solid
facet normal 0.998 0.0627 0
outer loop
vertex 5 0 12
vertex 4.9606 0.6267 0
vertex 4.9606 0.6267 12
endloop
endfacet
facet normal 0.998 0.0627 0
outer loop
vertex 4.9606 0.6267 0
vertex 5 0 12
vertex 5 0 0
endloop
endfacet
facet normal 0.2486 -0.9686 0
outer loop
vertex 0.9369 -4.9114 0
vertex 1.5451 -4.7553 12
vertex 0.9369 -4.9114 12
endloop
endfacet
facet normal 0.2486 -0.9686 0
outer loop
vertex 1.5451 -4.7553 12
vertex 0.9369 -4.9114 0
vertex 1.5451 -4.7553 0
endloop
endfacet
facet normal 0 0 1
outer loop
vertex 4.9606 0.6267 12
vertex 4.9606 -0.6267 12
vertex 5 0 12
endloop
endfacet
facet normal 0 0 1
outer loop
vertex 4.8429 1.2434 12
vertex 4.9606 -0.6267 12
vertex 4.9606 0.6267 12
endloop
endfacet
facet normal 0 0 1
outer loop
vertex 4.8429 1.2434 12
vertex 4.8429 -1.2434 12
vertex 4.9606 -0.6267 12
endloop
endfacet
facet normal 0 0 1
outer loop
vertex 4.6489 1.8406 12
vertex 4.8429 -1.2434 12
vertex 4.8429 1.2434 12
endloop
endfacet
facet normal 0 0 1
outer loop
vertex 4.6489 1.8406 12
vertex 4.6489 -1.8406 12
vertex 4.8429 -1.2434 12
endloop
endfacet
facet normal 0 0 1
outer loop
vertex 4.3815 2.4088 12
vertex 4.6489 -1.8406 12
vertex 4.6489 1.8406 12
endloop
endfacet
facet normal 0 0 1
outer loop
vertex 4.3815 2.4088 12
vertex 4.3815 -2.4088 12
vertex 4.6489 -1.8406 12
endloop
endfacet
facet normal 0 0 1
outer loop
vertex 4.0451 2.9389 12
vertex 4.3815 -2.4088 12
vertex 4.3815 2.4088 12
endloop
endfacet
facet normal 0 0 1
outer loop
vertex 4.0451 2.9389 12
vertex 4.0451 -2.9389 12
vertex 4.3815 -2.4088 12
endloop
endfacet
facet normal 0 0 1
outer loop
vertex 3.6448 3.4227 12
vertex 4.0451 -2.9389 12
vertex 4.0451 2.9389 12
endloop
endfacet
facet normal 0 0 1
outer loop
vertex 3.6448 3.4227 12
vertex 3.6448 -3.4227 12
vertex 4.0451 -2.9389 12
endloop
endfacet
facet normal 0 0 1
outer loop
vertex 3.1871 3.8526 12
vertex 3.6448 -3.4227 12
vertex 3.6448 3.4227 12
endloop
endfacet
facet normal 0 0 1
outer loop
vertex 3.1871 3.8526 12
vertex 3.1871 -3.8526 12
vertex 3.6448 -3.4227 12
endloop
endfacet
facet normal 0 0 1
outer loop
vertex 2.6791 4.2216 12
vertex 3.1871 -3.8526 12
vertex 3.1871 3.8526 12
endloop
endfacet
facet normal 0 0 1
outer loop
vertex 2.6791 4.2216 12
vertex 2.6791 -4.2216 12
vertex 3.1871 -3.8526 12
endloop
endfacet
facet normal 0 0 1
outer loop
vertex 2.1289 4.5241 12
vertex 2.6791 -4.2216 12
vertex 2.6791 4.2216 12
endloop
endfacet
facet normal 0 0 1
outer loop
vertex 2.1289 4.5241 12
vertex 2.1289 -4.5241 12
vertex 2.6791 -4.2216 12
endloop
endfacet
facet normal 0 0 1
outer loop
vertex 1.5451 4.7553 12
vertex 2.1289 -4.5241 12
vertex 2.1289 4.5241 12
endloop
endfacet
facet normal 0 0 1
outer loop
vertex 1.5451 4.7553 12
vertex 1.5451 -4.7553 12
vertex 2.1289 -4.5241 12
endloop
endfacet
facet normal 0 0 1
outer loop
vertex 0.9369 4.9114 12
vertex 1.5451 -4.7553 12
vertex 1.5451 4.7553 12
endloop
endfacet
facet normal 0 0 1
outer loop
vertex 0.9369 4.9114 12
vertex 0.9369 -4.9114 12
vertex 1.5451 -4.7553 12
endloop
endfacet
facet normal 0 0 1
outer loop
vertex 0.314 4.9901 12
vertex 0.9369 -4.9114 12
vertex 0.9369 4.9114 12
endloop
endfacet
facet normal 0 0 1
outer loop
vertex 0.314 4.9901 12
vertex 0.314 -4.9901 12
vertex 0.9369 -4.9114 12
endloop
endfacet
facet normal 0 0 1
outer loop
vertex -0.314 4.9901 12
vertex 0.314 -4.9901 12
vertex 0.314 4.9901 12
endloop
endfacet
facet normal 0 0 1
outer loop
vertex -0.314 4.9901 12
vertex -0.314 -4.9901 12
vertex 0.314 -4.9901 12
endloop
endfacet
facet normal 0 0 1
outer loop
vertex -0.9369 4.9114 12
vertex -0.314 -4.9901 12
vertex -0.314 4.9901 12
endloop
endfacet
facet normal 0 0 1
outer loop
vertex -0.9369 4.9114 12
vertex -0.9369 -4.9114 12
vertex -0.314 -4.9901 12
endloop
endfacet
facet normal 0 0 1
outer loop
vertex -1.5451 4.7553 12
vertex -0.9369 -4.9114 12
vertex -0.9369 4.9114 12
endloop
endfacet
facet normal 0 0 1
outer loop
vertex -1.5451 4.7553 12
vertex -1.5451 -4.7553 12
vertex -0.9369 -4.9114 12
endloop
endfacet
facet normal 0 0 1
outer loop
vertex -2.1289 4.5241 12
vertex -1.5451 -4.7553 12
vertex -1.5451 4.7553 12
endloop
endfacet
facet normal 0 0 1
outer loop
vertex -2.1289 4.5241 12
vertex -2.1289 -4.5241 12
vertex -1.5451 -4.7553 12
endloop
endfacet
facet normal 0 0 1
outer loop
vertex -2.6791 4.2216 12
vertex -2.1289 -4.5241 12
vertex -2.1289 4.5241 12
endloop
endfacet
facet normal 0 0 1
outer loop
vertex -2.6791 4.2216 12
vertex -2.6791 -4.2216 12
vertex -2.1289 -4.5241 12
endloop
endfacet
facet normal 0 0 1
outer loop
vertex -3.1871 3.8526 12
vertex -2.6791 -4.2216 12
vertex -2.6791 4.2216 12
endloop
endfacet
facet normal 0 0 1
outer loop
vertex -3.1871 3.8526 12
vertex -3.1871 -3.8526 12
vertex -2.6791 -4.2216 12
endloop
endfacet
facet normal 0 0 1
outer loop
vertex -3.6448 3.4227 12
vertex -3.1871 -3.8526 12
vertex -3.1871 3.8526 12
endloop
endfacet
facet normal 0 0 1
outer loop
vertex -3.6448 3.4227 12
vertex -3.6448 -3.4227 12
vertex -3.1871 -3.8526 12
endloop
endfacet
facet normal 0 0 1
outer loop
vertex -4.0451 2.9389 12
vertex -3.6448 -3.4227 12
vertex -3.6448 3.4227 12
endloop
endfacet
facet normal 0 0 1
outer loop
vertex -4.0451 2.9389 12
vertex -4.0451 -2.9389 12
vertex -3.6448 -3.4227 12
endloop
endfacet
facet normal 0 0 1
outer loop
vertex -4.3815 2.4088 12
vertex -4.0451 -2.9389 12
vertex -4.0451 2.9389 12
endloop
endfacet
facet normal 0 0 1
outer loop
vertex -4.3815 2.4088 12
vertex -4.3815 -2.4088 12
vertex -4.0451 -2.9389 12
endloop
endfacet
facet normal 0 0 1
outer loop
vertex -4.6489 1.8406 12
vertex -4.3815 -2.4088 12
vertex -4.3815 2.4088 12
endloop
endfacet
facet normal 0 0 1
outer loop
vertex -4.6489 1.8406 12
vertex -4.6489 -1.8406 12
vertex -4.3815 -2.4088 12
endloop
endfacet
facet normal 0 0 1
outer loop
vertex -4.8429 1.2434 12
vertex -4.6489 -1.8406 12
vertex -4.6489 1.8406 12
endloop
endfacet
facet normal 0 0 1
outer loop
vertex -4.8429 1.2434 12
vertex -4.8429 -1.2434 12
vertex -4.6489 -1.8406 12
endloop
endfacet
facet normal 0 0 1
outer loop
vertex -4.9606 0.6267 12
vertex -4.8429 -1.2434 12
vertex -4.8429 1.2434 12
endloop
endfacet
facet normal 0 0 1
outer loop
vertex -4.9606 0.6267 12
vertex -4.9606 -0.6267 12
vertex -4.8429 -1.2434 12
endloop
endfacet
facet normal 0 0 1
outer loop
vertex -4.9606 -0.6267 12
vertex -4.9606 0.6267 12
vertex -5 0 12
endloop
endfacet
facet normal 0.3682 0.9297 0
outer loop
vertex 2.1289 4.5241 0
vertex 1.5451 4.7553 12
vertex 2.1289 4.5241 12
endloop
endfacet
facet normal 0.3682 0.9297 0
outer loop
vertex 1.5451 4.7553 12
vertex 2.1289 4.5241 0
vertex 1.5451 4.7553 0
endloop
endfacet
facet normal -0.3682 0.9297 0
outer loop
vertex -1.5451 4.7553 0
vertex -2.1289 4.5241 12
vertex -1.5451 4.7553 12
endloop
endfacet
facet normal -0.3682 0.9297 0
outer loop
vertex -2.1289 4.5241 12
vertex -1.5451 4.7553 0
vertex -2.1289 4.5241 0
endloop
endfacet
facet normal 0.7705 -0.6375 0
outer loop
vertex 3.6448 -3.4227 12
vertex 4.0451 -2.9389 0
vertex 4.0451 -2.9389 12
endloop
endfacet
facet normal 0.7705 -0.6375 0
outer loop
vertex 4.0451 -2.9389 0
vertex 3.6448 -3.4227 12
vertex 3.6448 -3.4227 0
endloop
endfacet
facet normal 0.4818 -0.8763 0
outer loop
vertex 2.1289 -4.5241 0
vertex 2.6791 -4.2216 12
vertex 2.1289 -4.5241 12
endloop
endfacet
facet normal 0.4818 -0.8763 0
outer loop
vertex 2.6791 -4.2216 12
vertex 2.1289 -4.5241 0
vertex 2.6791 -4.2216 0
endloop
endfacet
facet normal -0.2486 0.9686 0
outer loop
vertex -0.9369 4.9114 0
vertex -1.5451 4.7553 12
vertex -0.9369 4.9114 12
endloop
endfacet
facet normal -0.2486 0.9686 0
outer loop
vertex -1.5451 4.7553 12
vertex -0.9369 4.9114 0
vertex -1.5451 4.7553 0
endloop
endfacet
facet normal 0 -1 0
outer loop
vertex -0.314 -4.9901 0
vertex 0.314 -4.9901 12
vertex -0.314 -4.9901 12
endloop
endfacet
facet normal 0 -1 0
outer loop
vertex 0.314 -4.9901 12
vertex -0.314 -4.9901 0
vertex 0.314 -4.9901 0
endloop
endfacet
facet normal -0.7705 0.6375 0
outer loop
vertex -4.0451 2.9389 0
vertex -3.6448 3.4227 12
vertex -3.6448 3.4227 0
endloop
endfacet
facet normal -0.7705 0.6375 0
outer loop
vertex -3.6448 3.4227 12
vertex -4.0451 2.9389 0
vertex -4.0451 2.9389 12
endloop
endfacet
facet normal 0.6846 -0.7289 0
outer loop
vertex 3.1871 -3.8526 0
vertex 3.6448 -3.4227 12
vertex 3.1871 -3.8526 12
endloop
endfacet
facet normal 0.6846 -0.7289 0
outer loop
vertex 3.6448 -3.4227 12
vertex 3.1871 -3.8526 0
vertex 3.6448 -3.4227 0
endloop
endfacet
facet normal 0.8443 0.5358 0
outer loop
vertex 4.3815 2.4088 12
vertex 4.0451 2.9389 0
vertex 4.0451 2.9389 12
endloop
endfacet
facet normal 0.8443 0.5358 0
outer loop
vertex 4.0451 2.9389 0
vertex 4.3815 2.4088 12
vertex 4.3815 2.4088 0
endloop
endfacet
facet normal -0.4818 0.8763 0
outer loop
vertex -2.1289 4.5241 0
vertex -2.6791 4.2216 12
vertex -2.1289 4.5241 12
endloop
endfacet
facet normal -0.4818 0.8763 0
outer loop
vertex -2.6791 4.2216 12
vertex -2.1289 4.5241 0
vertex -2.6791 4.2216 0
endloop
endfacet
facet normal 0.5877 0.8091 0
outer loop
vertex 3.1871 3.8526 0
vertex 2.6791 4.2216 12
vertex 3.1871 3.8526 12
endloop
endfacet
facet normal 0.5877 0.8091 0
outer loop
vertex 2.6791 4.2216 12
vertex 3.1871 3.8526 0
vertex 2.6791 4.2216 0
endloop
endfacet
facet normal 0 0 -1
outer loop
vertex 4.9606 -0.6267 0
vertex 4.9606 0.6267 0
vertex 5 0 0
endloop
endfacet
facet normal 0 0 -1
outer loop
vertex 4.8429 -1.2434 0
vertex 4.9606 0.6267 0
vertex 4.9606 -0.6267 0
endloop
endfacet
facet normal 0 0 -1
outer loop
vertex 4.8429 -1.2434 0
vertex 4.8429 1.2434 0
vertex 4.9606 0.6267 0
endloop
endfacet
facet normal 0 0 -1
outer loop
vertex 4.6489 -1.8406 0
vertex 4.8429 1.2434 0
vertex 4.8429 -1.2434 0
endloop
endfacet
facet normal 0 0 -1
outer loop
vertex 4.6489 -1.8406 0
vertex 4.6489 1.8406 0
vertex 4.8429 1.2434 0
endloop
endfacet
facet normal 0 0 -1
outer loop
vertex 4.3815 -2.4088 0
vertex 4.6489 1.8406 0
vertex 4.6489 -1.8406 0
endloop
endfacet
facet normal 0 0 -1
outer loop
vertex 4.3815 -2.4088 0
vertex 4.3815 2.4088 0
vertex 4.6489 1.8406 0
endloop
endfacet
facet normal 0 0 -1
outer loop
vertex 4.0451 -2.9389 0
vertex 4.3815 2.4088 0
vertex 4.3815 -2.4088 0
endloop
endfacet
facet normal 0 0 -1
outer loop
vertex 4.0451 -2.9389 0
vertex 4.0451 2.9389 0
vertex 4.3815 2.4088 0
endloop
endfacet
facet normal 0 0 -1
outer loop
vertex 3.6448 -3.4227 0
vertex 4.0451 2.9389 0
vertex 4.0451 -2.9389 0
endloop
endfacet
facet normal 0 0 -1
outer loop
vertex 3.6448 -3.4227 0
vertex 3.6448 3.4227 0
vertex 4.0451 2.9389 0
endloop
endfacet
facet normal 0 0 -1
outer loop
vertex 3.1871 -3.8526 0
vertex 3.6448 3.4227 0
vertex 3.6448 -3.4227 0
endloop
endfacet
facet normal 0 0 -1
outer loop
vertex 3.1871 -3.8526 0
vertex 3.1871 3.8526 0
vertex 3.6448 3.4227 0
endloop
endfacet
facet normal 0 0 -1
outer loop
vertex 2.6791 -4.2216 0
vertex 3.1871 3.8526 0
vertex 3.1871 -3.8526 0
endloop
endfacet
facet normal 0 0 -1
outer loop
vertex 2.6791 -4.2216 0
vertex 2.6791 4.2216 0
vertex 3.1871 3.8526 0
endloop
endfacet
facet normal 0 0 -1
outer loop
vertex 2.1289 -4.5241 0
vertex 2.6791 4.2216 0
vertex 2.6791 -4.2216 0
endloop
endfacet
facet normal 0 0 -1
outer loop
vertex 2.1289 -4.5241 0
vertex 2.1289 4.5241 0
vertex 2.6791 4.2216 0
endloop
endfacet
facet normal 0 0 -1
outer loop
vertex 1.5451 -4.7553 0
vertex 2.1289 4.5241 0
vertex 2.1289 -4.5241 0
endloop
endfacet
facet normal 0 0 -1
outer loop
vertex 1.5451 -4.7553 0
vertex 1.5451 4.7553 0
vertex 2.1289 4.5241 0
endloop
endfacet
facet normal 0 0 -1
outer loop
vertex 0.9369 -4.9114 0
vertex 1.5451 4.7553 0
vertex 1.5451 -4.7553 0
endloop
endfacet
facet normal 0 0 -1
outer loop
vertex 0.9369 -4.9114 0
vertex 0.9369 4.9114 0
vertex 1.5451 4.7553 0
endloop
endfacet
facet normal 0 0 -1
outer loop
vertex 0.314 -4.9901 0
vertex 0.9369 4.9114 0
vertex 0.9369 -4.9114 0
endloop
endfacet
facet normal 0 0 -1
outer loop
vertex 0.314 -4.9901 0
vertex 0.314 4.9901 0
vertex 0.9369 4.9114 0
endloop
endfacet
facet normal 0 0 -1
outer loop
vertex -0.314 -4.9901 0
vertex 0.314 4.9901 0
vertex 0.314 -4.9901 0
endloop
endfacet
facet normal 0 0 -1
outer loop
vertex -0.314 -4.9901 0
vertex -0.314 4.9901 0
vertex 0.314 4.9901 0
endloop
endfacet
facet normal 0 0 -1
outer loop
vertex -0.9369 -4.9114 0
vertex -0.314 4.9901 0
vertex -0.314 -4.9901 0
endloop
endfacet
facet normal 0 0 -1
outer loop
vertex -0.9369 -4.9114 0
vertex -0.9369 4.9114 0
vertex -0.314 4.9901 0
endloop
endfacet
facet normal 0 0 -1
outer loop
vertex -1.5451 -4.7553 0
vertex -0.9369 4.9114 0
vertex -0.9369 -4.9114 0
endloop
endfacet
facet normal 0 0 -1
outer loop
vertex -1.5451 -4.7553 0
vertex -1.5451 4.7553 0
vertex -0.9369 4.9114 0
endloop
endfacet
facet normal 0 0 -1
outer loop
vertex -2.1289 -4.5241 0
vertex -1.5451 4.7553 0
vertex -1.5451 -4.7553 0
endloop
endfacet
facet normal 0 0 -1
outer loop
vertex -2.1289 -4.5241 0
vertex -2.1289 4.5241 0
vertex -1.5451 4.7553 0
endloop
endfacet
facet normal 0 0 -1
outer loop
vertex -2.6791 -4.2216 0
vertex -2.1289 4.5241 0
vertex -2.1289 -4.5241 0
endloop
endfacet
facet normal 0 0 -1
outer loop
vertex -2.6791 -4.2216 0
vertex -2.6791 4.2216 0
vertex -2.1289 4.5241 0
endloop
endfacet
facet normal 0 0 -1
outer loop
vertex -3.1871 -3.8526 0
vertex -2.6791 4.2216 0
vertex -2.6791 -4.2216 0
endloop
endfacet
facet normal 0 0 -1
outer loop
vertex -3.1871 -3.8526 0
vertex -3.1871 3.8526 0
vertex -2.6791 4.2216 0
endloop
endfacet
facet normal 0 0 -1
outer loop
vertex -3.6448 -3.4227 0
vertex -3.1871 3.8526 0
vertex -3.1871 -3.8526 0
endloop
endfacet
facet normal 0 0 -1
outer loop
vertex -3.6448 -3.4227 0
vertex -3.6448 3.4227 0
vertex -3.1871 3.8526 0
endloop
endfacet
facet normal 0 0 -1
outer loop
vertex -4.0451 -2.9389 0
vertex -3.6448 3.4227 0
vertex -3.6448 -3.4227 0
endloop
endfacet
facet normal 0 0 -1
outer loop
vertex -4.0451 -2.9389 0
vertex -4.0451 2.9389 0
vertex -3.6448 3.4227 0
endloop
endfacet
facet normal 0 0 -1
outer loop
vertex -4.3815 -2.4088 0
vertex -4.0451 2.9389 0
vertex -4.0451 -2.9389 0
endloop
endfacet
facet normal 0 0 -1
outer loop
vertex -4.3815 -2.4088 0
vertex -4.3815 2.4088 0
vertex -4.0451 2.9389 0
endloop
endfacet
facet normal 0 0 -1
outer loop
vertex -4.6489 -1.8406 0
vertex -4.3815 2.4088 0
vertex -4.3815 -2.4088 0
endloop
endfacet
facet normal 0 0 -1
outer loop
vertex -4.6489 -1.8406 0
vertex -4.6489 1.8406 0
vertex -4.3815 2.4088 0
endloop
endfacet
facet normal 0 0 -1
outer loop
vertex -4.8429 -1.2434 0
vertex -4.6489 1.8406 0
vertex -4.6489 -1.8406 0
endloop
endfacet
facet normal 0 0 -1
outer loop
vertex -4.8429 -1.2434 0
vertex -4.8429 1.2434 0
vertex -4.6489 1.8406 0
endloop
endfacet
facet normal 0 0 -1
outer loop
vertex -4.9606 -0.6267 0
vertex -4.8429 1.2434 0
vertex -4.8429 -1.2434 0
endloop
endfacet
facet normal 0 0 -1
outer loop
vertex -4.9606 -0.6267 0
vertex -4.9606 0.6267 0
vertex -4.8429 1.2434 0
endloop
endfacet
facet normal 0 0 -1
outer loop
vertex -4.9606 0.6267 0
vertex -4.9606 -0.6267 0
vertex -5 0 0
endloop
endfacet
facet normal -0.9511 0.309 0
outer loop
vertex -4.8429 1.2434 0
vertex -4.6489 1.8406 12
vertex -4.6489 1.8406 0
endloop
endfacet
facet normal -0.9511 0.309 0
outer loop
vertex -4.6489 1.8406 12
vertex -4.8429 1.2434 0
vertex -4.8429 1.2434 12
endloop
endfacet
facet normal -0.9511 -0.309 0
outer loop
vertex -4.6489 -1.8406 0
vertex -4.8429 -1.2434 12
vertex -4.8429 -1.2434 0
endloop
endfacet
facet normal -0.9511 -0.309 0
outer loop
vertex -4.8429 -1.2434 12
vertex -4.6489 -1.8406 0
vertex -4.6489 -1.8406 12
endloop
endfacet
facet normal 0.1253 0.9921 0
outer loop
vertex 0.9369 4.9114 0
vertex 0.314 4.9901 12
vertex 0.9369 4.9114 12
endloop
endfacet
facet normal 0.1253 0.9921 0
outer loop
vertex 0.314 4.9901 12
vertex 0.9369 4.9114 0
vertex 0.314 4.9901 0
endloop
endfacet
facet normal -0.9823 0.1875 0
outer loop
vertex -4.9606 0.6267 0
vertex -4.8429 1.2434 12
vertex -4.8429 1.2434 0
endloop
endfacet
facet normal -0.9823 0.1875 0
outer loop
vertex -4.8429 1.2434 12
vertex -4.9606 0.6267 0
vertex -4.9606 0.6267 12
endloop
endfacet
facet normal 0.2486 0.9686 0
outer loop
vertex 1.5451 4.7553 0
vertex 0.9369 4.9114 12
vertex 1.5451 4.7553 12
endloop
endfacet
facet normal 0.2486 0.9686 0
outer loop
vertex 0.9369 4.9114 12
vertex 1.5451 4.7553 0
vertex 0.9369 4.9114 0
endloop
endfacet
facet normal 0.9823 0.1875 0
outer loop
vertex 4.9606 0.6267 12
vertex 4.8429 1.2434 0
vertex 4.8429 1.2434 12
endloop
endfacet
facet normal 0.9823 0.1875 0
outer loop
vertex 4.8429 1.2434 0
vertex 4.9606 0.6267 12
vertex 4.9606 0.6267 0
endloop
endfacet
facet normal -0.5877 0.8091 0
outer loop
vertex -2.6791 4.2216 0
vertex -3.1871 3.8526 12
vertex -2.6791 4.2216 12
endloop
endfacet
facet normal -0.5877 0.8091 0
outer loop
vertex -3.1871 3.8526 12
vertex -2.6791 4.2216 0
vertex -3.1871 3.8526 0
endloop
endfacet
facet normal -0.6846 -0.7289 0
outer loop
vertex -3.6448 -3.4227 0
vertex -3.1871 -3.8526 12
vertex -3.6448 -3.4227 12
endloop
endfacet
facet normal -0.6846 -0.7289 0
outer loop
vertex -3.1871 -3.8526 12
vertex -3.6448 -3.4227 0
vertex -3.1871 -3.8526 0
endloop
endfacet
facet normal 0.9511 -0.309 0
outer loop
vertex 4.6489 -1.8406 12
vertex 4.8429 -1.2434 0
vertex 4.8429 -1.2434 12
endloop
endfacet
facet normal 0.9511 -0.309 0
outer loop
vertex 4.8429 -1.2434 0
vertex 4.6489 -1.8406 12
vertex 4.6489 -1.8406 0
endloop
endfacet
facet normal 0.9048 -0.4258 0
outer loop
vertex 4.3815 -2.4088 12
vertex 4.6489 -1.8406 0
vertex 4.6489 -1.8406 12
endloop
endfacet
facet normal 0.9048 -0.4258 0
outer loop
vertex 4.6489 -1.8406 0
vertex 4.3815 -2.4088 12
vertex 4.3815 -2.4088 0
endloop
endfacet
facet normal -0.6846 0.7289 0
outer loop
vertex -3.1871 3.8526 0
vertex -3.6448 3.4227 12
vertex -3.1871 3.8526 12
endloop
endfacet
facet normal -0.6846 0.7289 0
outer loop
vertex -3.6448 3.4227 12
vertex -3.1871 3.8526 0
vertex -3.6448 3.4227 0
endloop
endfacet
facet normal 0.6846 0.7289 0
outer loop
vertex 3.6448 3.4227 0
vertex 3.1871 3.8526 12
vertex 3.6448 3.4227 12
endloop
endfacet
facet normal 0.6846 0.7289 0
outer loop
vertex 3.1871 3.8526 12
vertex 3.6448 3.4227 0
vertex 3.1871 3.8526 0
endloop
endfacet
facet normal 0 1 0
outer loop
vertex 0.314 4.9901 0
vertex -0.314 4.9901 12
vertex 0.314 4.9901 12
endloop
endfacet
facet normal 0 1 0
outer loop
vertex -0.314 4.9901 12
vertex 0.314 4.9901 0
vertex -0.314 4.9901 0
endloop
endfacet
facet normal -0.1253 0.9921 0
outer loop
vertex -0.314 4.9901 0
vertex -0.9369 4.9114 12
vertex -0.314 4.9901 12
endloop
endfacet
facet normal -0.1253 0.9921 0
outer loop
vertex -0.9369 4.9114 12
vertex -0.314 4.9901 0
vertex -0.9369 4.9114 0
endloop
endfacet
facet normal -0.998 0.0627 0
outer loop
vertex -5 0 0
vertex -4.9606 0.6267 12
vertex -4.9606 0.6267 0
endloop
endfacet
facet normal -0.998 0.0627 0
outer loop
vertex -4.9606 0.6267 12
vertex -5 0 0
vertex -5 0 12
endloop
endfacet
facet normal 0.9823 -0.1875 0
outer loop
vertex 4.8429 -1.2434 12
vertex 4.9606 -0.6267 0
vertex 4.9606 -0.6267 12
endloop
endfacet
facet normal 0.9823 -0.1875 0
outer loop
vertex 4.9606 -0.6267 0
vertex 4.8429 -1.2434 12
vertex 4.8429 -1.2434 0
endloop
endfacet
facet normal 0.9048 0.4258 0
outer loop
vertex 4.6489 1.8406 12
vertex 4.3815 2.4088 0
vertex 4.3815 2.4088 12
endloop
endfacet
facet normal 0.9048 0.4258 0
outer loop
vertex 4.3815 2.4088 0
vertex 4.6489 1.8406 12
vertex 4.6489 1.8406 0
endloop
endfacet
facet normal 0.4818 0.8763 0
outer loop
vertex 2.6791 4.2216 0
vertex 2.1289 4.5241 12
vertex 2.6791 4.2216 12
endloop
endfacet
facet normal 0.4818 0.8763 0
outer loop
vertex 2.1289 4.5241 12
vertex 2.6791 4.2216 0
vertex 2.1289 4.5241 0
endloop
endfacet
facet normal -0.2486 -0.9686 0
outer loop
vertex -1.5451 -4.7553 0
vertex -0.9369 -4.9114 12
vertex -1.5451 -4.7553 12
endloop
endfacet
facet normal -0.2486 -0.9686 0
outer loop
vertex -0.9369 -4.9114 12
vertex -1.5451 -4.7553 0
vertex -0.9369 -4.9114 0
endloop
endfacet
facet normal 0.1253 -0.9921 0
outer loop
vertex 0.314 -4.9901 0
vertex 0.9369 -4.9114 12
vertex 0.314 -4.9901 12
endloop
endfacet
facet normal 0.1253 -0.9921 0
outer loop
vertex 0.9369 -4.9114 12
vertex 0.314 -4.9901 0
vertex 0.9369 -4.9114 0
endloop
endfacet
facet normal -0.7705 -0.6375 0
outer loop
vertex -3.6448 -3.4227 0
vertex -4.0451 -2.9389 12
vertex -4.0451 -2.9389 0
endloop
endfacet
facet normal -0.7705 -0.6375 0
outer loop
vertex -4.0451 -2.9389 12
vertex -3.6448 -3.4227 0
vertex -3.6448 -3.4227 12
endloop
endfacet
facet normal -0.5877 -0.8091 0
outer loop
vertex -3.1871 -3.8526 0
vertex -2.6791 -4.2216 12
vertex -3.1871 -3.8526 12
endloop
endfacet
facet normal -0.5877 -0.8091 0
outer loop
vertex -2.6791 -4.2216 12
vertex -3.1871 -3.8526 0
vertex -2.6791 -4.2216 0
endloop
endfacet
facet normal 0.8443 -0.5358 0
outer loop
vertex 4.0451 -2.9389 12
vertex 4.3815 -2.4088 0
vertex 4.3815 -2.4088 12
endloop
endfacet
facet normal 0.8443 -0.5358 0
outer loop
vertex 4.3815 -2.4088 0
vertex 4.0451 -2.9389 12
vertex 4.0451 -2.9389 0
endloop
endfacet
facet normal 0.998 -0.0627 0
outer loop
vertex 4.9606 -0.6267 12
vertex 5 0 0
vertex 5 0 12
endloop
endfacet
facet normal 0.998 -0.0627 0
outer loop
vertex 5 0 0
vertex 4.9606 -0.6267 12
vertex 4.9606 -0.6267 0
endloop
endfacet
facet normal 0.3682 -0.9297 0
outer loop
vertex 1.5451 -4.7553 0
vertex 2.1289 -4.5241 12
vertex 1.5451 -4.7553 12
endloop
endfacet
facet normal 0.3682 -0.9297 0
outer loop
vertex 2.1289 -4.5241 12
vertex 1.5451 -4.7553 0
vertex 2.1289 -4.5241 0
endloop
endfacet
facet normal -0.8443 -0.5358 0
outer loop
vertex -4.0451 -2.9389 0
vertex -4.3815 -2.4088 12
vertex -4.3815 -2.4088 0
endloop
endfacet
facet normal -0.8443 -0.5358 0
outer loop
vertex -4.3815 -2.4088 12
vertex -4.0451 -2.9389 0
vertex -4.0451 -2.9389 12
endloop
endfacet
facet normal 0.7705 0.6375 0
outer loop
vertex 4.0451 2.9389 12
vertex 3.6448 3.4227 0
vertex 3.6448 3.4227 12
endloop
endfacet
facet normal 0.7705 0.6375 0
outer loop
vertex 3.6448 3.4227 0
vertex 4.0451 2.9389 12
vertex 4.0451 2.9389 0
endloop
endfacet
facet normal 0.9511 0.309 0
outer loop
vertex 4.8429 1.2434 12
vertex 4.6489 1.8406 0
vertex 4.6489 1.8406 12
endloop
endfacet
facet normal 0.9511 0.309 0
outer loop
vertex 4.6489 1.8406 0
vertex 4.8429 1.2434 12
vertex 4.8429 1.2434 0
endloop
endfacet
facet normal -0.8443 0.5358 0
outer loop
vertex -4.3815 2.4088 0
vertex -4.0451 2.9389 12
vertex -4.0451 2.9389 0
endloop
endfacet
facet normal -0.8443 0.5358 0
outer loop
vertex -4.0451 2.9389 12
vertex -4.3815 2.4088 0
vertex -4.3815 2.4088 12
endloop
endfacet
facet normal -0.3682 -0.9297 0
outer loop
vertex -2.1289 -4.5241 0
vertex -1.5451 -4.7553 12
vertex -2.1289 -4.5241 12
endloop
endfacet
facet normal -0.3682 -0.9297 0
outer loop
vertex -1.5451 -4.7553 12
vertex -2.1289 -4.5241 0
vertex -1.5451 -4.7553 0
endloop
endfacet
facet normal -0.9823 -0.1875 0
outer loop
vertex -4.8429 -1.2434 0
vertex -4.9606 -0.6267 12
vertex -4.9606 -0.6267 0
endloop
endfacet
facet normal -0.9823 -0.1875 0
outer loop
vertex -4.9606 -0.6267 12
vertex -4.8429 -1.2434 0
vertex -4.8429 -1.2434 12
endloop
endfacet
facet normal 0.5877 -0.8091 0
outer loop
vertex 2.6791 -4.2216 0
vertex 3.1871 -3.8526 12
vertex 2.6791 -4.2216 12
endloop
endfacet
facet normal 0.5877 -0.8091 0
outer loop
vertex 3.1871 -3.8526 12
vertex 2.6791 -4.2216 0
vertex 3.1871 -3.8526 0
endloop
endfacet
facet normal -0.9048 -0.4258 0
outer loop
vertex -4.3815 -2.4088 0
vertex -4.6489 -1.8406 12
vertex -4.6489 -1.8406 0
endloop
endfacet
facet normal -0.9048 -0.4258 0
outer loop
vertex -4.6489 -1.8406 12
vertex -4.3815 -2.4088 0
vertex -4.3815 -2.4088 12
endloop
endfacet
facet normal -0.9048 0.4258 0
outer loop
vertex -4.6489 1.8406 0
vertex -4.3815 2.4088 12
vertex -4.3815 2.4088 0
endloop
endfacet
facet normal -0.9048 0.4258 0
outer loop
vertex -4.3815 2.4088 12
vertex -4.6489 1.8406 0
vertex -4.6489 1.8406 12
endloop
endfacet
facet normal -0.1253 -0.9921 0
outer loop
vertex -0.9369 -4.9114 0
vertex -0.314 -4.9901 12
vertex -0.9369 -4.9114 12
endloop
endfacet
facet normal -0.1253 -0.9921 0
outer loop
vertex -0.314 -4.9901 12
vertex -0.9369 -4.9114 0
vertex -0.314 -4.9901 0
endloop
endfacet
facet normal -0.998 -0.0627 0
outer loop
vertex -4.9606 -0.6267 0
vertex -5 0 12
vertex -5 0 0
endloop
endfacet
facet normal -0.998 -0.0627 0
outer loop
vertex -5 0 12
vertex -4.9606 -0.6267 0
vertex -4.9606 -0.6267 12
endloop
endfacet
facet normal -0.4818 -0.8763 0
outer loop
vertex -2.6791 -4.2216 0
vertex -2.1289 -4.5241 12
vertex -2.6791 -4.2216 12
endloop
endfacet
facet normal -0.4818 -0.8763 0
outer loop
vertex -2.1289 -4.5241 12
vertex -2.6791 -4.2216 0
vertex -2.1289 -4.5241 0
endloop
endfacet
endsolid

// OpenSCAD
$fn = 50;

difference() {
	union() {
		cylinder(h = 12, r = 5);
	}
	union();
}
